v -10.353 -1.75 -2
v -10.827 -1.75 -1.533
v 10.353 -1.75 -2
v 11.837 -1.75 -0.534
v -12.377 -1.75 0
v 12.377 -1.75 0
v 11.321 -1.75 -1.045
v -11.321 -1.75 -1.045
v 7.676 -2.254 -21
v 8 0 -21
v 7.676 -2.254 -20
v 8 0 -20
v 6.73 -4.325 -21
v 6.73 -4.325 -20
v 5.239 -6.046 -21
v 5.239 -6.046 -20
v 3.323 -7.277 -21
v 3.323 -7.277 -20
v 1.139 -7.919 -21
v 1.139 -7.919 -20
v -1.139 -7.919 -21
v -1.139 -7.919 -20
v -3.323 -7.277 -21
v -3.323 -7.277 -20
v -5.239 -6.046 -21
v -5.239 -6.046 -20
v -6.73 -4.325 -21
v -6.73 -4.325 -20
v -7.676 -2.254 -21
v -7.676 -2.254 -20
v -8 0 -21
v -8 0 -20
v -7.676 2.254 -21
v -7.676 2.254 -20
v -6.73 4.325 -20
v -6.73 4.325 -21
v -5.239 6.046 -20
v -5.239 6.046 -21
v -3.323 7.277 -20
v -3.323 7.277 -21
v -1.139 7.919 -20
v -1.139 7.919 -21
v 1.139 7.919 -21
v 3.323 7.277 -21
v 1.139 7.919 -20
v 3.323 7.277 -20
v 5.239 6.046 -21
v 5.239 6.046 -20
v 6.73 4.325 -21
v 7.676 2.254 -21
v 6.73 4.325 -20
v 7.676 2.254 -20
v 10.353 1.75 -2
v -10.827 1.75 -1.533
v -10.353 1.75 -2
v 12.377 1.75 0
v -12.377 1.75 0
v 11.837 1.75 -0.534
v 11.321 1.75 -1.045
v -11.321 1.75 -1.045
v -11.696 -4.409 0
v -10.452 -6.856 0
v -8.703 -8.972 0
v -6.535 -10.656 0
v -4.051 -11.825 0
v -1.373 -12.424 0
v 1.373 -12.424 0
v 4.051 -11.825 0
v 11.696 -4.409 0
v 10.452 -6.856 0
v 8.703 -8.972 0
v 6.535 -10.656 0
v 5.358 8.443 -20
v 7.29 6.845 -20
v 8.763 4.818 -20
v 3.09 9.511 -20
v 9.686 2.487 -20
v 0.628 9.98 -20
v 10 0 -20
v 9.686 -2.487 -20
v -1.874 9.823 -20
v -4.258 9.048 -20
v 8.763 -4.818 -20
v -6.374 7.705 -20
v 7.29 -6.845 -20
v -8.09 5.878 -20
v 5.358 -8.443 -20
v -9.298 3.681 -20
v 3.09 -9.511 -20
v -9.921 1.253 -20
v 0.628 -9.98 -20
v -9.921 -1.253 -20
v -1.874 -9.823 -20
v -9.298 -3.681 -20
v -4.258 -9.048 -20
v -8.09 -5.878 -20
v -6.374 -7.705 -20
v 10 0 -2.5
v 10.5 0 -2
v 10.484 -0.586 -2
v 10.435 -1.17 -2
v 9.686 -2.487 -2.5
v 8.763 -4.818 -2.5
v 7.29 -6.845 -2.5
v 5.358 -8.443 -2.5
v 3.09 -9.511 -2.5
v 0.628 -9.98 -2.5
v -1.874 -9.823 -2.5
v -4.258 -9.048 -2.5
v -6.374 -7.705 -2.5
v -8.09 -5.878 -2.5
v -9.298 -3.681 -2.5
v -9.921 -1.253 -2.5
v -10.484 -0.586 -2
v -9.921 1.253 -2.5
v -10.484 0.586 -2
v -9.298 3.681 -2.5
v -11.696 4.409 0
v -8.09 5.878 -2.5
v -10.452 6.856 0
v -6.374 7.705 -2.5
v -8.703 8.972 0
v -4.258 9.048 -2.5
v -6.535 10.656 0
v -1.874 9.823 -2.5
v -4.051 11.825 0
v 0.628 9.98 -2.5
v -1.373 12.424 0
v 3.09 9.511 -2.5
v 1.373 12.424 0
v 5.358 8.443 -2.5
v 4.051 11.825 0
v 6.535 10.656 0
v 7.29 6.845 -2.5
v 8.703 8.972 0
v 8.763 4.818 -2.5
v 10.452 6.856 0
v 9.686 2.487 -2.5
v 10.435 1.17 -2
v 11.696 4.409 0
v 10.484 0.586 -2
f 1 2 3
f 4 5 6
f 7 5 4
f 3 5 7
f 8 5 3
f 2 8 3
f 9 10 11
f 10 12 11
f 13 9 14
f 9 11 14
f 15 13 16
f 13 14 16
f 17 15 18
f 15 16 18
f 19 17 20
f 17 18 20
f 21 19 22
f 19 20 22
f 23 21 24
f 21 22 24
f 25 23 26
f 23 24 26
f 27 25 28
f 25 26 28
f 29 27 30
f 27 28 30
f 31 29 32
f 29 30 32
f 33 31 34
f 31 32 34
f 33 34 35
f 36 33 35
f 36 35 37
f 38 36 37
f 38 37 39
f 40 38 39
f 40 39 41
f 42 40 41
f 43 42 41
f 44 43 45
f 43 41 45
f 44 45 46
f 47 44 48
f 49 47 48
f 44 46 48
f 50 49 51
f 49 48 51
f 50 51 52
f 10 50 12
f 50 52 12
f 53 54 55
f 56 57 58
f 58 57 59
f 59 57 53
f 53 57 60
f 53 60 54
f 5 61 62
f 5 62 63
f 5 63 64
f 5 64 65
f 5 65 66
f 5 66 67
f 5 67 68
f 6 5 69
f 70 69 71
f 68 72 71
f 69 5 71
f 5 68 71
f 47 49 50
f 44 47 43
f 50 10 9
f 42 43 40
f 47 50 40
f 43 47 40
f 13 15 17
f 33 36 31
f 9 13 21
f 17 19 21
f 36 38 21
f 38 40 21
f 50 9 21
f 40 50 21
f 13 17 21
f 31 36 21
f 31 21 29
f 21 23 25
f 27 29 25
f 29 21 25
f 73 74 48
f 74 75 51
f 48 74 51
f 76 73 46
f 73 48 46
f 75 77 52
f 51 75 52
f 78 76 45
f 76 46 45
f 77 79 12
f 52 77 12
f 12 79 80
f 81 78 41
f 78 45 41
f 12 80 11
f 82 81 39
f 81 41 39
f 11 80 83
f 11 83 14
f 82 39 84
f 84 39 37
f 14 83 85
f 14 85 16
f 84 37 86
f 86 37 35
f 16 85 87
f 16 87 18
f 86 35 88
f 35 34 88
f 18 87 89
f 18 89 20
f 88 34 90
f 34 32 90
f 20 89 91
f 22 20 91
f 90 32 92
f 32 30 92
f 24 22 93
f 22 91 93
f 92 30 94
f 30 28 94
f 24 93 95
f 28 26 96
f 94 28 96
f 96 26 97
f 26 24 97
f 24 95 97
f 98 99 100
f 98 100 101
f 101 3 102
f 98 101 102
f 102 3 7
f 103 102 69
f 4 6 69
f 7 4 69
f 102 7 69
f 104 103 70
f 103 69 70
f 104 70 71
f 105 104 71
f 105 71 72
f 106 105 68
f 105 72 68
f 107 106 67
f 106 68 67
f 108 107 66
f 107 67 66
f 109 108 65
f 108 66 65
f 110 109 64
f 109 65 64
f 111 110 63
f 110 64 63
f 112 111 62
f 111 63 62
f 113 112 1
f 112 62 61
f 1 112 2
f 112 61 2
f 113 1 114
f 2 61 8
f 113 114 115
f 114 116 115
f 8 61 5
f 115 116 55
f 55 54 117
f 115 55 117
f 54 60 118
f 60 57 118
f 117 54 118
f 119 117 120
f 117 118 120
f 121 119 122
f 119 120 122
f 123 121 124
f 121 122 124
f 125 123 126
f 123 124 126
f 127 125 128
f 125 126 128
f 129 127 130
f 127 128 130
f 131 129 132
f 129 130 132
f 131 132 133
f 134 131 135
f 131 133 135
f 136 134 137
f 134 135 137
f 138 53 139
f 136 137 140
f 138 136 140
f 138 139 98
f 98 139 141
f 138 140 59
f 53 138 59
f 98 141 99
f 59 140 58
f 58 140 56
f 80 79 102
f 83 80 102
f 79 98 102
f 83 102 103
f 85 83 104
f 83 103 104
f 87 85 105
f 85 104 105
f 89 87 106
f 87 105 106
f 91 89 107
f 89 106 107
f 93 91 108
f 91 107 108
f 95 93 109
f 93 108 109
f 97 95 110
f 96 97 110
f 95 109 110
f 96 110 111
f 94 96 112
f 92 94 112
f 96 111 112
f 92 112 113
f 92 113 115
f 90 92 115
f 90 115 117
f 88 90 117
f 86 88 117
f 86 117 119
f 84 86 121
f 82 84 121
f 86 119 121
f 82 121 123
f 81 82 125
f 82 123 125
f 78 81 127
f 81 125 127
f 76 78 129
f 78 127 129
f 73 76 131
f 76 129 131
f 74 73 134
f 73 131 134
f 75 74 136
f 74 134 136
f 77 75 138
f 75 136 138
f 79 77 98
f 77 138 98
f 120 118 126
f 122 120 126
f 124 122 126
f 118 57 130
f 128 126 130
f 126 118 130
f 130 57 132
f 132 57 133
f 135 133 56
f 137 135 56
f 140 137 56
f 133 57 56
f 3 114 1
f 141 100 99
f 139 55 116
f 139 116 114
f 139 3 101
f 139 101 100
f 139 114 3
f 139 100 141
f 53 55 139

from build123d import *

# Parameters (mm, degrees)
F2_W     = 30
F2_H     = 3.5
F3_DEPTH = 2


with BuildPart() as f1:
    # F0 (on Front) → F1 (revolve)
    with BuildSketch(Plane.XZ):
        Polygon((12.5, 0), (0, 0), (0, -21), (8, -21), (8, -20), (10, -20), (10, -2.5), align=None)
    revolve(axis=Axis((0, 0, -12.648922), (0, 0, -1)))

    # F2 (on face) → F3 (cut)
    with BuildSketch(Plane.XY):
        with Locations((1.177149, 0)):
            Rectangle(F2_W, F2_H)
    extrude(amount=-F3_DEPTH, mode=Mode.SUBTRACT)


solid = f1.part
